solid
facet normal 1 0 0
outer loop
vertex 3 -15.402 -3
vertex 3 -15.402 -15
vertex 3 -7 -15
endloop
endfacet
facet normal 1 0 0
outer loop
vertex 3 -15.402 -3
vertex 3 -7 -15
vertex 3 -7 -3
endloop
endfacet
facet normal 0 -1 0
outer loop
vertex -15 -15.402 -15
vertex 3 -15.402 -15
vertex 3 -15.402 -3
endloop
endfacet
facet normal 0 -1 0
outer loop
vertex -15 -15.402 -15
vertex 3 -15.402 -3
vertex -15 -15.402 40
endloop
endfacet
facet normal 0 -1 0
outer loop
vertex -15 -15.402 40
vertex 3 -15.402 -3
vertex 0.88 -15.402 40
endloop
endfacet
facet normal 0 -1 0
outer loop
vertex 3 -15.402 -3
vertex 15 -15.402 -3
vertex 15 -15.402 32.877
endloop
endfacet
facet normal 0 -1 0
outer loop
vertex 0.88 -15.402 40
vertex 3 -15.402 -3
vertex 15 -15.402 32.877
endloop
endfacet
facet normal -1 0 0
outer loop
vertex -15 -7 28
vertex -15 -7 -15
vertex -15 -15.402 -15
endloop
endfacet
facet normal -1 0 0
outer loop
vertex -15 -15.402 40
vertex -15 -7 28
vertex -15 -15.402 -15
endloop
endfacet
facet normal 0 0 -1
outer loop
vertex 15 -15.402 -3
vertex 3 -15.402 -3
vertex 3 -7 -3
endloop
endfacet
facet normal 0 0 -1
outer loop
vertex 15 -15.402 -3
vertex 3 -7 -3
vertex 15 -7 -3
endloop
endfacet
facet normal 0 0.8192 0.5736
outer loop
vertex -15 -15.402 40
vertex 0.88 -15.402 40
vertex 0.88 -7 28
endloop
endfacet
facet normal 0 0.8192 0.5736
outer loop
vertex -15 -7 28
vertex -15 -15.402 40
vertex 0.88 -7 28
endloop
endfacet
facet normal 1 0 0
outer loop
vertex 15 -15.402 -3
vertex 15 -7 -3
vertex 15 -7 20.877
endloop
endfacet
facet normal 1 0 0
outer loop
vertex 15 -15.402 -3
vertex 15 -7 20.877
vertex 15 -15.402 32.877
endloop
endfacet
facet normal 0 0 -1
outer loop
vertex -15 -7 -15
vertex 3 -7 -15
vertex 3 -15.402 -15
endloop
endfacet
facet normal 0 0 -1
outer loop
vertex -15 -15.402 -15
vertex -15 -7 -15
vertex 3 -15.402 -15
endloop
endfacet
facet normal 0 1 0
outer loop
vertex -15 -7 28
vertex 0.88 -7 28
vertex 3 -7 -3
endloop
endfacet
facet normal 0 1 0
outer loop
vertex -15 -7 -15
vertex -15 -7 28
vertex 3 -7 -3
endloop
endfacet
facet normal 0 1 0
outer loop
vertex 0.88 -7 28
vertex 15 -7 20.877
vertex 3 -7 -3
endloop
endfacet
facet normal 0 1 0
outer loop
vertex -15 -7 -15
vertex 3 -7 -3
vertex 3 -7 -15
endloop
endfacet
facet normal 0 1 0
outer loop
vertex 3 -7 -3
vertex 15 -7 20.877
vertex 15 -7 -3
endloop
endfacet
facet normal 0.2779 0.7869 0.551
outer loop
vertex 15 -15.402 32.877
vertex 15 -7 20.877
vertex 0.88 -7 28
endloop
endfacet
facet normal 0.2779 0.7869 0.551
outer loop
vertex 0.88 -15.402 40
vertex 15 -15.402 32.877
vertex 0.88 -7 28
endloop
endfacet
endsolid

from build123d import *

# Parameters (mm, degrees)
BOSS_EXTRUDE1_DEPTH = 15
SKETCH6_R           = 26.898177411
CUT_EXTRUDE2_DEPTH  = 9
SKETCH7_W           = 12
SKETCH7_H           = 12
CUT_EXTRUDE3_DEPTH  = 10


with BuildPart() as part:
    # Sketch1 → Boss-Extrude1 (new, symmetric)
    with BuildSketch(Plane(origin=(0, 0, 0), x_dir=(0, 0, -1), z_dir=(1, 0, 0))):
        Polygon((-28, -7), (15, -7), (15, -15.402490459), (-40, -15.402490459), align=None)
    extrude(amount=BOSS_EXTRUDE1_DEPTH, both=True)

    # Sketch6 → Cut-Extrude2 (cut)
    with BuildSketch(Plane(origin=(2.825070642, 7.997590477, 5.599973139), x_dir=(-0.9605940806562516, 0.22768745094625853, 0.1594284695083218), z_dir=(-0.27795505429506184, -0.7868726049014764, -0.5509741295627175))):
        with Locations((-5.77915715, -31.909329579)):
            Circle(SKETCH6_R)
    extrude(amount=-CUT_EXTRUDE2_DEPTH, mode=Mode.SUBTRACT)

    # Sketch7 → Cut-Extrude3 (cut)
    with BuildSketch(Plane.XZ.offset(15.402490459)):
        with Locations((9, -9)):
            Rectangle(SKETCH7_W, SKETCH7_H)
    extrude(amount=-CUT_EXTRUDE3_DEPTH, mode=Mode.SUBTRACT)


solid = part.part
